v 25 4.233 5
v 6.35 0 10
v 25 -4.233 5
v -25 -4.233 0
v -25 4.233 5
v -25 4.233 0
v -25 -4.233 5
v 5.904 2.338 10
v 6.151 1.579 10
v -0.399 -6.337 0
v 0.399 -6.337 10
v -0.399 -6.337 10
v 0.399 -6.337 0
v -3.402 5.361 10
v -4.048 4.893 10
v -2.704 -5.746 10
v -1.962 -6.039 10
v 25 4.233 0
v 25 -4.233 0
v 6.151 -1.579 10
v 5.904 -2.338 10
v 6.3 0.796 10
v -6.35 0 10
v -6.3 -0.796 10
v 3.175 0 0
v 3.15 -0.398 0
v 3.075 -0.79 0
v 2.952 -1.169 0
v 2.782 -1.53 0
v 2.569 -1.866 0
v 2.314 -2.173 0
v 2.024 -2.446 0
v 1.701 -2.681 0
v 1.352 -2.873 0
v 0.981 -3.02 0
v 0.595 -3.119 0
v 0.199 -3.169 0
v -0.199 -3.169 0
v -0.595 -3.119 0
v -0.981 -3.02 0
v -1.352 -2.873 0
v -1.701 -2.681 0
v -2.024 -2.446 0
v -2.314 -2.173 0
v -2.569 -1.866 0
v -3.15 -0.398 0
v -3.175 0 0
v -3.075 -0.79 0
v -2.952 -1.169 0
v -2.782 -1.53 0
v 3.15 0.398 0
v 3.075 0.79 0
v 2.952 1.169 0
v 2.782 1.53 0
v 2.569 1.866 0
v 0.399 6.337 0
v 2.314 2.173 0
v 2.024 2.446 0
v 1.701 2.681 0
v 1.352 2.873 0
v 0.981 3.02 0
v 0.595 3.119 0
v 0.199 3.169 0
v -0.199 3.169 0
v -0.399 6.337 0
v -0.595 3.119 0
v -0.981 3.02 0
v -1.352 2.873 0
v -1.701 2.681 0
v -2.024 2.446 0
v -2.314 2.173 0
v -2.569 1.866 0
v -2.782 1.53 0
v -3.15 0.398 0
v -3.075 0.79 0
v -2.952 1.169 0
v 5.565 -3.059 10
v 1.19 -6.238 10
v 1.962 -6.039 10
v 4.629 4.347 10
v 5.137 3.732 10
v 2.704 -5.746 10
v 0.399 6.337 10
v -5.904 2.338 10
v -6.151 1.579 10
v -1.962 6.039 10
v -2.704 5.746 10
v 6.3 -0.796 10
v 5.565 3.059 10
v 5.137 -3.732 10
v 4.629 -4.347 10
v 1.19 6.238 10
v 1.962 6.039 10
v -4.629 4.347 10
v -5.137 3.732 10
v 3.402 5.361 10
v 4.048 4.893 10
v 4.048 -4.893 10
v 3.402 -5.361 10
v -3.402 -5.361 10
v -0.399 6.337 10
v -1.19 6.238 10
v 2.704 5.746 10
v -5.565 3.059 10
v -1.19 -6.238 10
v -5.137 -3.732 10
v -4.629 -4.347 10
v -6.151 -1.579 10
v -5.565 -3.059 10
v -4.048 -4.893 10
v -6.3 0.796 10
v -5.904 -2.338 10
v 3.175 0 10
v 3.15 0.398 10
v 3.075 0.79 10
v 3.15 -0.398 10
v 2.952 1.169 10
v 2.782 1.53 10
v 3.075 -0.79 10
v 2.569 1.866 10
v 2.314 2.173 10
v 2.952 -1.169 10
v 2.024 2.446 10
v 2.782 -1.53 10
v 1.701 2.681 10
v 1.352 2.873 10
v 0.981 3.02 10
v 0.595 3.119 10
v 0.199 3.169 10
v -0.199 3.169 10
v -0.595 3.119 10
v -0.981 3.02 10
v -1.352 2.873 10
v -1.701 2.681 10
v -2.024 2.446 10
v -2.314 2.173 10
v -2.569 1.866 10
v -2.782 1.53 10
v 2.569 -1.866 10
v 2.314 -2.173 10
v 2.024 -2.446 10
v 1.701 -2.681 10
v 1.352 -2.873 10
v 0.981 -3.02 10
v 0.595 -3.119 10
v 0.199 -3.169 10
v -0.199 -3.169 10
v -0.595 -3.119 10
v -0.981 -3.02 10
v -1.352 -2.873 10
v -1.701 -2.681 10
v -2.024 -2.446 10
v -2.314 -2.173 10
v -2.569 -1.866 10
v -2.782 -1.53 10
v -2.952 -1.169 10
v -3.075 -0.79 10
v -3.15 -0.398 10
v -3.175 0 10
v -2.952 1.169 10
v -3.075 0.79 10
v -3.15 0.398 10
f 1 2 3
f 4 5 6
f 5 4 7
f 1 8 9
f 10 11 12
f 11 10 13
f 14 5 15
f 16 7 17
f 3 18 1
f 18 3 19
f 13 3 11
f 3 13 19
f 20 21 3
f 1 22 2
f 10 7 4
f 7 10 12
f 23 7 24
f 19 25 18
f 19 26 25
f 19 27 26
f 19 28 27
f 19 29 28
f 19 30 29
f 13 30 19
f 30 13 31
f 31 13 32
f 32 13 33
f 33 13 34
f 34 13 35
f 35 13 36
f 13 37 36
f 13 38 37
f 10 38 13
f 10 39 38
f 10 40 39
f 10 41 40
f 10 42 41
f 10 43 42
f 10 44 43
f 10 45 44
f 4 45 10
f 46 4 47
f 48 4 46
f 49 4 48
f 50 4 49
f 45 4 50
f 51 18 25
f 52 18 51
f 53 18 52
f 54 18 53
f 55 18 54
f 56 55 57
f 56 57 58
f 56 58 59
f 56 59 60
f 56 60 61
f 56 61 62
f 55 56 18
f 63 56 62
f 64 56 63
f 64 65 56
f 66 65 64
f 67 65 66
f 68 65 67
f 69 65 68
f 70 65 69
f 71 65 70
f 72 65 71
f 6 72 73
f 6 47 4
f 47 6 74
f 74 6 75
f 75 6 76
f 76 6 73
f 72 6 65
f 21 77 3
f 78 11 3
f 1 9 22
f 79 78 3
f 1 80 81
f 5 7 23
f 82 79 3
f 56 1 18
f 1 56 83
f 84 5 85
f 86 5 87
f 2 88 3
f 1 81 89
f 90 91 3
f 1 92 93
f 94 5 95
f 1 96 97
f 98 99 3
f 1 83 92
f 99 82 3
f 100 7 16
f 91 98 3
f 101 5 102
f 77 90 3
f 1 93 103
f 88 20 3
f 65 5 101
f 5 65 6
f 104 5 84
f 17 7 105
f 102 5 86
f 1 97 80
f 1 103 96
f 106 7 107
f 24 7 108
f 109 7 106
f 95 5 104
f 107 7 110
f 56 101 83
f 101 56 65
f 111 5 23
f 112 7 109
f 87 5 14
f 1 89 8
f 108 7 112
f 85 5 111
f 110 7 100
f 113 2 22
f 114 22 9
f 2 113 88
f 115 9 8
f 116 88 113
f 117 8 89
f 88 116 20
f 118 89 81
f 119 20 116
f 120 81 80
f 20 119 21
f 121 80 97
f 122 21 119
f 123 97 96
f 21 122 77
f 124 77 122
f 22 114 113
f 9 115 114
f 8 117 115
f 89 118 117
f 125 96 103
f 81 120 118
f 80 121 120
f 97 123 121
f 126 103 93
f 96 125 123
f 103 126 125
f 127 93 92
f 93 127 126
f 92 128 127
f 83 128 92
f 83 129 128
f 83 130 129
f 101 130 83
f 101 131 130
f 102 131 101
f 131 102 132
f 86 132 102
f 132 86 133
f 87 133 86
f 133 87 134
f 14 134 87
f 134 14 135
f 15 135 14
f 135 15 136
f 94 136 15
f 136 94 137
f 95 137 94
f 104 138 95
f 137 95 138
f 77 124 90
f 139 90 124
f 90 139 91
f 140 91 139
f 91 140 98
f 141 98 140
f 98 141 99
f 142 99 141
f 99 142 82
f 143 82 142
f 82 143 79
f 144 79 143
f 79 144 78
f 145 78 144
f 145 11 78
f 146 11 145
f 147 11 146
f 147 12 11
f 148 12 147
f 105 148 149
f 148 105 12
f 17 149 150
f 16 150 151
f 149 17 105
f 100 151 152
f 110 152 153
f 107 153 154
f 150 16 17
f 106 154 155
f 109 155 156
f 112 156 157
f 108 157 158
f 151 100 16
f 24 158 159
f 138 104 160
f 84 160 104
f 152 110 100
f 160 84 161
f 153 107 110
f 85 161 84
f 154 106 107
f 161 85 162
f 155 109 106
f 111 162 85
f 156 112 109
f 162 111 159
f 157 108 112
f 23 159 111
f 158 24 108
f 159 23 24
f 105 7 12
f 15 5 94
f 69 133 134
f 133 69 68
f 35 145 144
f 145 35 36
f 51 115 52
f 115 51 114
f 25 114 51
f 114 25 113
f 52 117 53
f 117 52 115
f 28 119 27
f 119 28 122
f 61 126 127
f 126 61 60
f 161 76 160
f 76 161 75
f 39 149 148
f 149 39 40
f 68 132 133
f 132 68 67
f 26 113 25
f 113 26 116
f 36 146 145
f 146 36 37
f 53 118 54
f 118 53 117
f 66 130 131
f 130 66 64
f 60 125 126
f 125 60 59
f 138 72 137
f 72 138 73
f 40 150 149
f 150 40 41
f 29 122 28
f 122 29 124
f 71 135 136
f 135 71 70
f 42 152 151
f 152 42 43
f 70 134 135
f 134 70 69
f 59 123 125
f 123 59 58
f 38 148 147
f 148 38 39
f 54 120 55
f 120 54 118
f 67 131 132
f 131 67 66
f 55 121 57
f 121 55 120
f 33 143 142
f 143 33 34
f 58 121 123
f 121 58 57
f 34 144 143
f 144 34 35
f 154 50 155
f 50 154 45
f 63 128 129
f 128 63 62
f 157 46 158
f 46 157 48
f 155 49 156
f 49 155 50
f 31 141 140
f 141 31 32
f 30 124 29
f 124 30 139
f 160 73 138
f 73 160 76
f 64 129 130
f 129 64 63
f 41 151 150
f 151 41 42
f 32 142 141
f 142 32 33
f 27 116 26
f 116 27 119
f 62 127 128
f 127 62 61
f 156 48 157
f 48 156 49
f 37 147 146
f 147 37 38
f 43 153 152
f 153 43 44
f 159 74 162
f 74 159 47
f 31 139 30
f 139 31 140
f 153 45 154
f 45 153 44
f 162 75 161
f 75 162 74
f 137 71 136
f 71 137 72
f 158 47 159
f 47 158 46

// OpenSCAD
$fn=50;

module foo() {
difference() {
    cylinder(h=10,d=25.4/3);
    cylinder(h=10,d=25.4/4);
}
}

HH=5;
INCH=25.4;
module handle() {
    difference() {
        hull() {
            cylinder(h=2*HH,d=INCH/2);
            translate([0,0,HH/2]) cube([50,INCH/3,HH],center=true);
        }
        cylinder(h=2*HH,d=INCH/4);
    }
}

module rounded_handle() {
    minkowski() {
        handle();
        sphere(d=4);
    }
}

handle();
